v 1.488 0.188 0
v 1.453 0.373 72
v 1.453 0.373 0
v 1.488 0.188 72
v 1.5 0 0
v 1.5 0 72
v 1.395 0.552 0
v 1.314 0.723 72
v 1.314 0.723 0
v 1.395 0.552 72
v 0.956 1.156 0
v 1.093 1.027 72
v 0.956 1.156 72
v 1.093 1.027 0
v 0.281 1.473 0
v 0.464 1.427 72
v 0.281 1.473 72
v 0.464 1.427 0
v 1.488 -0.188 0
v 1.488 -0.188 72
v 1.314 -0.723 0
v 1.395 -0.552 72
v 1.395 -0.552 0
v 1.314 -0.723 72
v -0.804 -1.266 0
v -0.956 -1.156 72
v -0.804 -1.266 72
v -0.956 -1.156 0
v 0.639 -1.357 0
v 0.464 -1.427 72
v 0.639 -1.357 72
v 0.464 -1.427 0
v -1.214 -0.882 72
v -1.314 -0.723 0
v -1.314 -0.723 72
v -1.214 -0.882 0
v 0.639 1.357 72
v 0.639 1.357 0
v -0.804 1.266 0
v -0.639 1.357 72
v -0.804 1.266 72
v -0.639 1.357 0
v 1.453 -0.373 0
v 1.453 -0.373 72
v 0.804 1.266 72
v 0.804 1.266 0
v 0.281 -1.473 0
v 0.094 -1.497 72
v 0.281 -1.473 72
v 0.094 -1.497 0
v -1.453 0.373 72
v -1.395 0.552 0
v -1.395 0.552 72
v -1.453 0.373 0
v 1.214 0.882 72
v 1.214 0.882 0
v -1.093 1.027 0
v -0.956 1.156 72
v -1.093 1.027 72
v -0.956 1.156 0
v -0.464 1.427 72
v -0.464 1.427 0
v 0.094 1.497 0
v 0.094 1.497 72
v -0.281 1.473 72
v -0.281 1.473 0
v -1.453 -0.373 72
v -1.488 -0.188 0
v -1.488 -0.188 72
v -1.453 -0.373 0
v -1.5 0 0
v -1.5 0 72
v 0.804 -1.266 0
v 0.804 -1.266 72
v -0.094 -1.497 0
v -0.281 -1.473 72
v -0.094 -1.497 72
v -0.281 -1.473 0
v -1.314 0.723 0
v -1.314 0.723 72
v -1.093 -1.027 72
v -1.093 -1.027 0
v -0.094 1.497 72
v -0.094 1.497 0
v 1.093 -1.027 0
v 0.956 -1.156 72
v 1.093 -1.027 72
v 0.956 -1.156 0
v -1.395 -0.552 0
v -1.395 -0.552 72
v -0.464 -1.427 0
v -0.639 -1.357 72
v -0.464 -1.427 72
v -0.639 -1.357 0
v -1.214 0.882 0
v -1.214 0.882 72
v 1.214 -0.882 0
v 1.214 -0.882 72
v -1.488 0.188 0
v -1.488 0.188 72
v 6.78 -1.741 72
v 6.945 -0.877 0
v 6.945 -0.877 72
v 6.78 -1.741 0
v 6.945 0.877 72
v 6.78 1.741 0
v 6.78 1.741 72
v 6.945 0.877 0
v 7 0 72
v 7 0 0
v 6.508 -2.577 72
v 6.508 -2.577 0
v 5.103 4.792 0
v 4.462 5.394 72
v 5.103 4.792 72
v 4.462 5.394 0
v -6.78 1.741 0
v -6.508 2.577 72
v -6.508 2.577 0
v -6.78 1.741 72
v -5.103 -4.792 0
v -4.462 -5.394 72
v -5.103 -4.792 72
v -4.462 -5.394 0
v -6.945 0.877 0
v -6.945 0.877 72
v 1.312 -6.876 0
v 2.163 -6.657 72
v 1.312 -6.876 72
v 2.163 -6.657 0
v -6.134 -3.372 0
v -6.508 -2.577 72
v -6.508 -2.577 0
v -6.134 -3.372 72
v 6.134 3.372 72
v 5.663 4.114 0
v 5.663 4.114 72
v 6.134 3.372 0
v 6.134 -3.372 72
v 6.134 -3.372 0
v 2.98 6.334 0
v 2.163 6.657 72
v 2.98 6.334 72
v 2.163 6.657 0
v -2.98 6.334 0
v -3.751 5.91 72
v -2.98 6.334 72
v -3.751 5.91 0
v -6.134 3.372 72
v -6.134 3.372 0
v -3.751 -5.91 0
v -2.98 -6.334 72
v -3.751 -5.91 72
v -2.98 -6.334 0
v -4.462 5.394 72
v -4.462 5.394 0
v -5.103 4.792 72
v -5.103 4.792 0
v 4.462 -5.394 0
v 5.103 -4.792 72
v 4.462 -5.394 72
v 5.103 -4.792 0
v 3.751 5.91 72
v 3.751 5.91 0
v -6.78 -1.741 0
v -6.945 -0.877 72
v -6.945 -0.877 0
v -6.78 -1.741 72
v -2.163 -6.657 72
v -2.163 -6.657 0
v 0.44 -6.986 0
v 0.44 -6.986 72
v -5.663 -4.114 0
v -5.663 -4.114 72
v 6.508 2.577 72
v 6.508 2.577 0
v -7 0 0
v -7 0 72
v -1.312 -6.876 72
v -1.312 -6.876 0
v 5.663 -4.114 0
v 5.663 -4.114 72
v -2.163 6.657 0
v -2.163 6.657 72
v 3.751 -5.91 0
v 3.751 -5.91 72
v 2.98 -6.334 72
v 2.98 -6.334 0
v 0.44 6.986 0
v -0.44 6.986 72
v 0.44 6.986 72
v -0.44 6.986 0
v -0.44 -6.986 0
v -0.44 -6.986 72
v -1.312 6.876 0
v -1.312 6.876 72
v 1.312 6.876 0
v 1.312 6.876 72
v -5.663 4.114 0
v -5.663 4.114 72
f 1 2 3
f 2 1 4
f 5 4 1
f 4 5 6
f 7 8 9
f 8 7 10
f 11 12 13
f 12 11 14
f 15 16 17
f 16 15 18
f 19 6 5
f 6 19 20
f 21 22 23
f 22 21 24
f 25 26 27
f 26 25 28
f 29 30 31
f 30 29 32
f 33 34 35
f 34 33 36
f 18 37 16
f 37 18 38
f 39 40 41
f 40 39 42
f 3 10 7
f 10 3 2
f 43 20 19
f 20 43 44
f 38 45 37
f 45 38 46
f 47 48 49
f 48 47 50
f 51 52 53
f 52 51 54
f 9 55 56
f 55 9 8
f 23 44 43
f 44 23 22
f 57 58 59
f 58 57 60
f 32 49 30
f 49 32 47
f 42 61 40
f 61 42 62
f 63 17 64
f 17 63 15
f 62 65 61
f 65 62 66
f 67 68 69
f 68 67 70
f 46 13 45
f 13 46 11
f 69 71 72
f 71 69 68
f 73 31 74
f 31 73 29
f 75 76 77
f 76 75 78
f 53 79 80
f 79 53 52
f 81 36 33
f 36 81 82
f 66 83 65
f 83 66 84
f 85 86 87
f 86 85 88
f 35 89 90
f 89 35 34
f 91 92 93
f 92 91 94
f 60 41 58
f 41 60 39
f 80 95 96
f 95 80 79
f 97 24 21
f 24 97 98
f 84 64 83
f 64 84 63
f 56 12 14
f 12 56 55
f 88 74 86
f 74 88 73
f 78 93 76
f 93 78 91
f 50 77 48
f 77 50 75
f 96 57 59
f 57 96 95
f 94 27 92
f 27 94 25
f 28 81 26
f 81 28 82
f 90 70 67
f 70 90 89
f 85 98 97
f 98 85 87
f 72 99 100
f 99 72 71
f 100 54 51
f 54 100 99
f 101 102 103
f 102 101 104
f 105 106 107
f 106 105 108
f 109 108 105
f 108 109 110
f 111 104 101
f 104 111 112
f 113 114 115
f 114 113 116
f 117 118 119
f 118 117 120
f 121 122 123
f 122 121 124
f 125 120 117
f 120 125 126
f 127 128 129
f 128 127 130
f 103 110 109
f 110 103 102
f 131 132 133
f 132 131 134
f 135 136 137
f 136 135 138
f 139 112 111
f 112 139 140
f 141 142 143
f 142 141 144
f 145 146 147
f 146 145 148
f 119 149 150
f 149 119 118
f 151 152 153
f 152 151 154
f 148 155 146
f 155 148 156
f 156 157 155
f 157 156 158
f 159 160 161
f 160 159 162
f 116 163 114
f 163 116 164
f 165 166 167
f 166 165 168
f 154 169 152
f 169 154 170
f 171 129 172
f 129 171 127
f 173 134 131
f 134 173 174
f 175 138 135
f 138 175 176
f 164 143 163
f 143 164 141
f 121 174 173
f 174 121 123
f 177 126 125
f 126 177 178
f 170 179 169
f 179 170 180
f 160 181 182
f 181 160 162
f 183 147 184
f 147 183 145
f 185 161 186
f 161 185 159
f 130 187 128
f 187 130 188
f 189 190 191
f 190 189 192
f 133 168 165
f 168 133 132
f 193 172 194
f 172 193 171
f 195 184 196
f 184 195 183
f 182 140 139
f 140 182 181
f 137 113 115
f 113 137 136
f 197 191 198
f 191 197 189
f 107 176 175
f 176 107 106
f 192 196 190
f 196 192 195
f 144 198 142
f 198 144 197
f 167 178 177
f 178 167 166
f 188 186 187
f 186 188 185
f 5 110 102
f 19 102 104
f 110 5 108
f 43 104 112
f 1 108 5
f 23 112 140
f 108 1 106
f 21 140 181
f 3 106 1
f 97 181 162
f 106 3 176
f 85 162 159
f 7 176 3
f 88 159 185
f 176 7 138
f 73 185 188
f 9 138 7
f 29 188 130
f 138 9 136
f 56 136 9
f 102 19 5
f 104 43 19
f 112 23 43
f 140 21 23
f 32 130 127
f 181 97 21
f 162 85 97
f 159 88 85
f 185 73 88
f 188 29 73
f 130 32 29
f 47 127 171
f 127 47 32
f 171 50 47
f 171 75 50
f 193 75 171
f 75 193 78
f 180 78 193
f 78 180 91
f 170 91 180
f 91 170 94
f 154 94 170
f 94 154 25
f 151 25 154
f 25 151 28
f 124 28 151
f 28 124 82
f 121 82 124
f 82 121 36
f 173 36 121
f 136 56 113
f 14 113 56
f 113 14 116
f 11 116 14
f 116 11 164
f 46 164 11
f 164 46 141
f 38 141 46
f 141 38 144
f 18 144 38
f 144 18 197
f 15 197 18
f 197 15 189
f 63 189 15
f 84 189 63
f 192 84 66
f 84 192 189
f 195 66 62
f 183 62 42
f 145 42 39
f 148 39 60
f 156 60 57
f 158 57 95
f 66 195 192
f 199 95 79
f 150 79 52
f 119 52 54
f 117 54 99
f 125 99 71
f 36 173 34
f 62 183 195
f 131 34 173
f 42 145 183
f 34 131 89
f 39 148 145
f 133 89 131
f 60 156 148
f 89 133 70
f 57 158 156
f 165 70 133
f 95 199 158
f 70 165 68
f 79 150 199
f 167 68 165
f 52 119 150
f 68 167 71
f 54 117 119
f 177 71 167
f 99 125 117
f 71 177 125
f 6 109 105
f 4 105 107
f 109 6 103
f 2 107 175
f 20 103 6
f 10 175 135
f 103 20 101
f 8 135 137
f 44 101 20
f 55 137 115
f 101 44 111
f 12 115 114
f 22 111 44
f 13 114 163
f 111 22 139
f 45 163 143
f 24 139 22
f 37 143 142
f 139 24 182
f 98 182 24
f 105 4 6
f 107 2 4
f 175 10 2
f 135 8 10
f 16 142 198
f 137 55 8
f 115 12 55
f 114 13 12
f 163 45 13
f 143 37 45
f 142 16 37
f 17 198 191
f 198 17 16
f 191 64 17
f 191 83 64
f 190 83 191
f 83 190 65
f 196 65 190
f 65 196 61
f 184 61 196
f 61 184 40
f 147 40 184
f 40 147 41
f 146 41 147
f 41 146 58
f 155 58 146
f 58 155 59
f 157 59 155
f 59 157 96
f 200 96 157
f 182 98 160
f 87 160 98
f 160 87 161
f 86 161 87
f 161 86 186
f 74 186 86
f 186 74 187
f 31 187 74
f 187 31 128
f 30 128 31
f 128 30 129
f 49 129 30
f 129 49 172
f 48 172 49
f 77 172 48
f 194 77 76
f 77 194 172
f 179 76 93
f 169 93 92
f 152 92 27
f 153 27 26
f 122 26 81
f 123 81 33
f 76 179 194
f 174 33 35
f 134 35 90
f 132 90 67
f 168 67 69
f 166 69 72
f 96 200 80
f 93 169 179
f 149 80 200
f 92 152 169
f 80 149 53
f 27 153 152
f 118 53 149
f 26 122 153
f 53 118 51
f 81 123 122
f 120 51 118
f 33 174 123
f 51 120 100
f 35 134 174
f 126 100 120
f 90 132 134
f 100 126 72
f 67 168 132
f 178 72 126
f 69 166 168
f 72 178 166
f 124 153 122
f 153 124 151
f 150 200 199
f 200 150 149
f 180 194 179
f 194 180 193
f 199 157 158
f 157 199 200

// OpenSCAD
$fn = 50;


difference() {
	union() {
		cylinder(h = 72, r = 7.0000000000);
	}
	union() {
		translate(v = [0, 0, -100]) {
			cylinder(h = 200, r = 1.5000000000);
		}
		translate(v = [0, 0, -100]) {
			cylinder(h = 200, r = 1.5000000000);
		}
	}
}
